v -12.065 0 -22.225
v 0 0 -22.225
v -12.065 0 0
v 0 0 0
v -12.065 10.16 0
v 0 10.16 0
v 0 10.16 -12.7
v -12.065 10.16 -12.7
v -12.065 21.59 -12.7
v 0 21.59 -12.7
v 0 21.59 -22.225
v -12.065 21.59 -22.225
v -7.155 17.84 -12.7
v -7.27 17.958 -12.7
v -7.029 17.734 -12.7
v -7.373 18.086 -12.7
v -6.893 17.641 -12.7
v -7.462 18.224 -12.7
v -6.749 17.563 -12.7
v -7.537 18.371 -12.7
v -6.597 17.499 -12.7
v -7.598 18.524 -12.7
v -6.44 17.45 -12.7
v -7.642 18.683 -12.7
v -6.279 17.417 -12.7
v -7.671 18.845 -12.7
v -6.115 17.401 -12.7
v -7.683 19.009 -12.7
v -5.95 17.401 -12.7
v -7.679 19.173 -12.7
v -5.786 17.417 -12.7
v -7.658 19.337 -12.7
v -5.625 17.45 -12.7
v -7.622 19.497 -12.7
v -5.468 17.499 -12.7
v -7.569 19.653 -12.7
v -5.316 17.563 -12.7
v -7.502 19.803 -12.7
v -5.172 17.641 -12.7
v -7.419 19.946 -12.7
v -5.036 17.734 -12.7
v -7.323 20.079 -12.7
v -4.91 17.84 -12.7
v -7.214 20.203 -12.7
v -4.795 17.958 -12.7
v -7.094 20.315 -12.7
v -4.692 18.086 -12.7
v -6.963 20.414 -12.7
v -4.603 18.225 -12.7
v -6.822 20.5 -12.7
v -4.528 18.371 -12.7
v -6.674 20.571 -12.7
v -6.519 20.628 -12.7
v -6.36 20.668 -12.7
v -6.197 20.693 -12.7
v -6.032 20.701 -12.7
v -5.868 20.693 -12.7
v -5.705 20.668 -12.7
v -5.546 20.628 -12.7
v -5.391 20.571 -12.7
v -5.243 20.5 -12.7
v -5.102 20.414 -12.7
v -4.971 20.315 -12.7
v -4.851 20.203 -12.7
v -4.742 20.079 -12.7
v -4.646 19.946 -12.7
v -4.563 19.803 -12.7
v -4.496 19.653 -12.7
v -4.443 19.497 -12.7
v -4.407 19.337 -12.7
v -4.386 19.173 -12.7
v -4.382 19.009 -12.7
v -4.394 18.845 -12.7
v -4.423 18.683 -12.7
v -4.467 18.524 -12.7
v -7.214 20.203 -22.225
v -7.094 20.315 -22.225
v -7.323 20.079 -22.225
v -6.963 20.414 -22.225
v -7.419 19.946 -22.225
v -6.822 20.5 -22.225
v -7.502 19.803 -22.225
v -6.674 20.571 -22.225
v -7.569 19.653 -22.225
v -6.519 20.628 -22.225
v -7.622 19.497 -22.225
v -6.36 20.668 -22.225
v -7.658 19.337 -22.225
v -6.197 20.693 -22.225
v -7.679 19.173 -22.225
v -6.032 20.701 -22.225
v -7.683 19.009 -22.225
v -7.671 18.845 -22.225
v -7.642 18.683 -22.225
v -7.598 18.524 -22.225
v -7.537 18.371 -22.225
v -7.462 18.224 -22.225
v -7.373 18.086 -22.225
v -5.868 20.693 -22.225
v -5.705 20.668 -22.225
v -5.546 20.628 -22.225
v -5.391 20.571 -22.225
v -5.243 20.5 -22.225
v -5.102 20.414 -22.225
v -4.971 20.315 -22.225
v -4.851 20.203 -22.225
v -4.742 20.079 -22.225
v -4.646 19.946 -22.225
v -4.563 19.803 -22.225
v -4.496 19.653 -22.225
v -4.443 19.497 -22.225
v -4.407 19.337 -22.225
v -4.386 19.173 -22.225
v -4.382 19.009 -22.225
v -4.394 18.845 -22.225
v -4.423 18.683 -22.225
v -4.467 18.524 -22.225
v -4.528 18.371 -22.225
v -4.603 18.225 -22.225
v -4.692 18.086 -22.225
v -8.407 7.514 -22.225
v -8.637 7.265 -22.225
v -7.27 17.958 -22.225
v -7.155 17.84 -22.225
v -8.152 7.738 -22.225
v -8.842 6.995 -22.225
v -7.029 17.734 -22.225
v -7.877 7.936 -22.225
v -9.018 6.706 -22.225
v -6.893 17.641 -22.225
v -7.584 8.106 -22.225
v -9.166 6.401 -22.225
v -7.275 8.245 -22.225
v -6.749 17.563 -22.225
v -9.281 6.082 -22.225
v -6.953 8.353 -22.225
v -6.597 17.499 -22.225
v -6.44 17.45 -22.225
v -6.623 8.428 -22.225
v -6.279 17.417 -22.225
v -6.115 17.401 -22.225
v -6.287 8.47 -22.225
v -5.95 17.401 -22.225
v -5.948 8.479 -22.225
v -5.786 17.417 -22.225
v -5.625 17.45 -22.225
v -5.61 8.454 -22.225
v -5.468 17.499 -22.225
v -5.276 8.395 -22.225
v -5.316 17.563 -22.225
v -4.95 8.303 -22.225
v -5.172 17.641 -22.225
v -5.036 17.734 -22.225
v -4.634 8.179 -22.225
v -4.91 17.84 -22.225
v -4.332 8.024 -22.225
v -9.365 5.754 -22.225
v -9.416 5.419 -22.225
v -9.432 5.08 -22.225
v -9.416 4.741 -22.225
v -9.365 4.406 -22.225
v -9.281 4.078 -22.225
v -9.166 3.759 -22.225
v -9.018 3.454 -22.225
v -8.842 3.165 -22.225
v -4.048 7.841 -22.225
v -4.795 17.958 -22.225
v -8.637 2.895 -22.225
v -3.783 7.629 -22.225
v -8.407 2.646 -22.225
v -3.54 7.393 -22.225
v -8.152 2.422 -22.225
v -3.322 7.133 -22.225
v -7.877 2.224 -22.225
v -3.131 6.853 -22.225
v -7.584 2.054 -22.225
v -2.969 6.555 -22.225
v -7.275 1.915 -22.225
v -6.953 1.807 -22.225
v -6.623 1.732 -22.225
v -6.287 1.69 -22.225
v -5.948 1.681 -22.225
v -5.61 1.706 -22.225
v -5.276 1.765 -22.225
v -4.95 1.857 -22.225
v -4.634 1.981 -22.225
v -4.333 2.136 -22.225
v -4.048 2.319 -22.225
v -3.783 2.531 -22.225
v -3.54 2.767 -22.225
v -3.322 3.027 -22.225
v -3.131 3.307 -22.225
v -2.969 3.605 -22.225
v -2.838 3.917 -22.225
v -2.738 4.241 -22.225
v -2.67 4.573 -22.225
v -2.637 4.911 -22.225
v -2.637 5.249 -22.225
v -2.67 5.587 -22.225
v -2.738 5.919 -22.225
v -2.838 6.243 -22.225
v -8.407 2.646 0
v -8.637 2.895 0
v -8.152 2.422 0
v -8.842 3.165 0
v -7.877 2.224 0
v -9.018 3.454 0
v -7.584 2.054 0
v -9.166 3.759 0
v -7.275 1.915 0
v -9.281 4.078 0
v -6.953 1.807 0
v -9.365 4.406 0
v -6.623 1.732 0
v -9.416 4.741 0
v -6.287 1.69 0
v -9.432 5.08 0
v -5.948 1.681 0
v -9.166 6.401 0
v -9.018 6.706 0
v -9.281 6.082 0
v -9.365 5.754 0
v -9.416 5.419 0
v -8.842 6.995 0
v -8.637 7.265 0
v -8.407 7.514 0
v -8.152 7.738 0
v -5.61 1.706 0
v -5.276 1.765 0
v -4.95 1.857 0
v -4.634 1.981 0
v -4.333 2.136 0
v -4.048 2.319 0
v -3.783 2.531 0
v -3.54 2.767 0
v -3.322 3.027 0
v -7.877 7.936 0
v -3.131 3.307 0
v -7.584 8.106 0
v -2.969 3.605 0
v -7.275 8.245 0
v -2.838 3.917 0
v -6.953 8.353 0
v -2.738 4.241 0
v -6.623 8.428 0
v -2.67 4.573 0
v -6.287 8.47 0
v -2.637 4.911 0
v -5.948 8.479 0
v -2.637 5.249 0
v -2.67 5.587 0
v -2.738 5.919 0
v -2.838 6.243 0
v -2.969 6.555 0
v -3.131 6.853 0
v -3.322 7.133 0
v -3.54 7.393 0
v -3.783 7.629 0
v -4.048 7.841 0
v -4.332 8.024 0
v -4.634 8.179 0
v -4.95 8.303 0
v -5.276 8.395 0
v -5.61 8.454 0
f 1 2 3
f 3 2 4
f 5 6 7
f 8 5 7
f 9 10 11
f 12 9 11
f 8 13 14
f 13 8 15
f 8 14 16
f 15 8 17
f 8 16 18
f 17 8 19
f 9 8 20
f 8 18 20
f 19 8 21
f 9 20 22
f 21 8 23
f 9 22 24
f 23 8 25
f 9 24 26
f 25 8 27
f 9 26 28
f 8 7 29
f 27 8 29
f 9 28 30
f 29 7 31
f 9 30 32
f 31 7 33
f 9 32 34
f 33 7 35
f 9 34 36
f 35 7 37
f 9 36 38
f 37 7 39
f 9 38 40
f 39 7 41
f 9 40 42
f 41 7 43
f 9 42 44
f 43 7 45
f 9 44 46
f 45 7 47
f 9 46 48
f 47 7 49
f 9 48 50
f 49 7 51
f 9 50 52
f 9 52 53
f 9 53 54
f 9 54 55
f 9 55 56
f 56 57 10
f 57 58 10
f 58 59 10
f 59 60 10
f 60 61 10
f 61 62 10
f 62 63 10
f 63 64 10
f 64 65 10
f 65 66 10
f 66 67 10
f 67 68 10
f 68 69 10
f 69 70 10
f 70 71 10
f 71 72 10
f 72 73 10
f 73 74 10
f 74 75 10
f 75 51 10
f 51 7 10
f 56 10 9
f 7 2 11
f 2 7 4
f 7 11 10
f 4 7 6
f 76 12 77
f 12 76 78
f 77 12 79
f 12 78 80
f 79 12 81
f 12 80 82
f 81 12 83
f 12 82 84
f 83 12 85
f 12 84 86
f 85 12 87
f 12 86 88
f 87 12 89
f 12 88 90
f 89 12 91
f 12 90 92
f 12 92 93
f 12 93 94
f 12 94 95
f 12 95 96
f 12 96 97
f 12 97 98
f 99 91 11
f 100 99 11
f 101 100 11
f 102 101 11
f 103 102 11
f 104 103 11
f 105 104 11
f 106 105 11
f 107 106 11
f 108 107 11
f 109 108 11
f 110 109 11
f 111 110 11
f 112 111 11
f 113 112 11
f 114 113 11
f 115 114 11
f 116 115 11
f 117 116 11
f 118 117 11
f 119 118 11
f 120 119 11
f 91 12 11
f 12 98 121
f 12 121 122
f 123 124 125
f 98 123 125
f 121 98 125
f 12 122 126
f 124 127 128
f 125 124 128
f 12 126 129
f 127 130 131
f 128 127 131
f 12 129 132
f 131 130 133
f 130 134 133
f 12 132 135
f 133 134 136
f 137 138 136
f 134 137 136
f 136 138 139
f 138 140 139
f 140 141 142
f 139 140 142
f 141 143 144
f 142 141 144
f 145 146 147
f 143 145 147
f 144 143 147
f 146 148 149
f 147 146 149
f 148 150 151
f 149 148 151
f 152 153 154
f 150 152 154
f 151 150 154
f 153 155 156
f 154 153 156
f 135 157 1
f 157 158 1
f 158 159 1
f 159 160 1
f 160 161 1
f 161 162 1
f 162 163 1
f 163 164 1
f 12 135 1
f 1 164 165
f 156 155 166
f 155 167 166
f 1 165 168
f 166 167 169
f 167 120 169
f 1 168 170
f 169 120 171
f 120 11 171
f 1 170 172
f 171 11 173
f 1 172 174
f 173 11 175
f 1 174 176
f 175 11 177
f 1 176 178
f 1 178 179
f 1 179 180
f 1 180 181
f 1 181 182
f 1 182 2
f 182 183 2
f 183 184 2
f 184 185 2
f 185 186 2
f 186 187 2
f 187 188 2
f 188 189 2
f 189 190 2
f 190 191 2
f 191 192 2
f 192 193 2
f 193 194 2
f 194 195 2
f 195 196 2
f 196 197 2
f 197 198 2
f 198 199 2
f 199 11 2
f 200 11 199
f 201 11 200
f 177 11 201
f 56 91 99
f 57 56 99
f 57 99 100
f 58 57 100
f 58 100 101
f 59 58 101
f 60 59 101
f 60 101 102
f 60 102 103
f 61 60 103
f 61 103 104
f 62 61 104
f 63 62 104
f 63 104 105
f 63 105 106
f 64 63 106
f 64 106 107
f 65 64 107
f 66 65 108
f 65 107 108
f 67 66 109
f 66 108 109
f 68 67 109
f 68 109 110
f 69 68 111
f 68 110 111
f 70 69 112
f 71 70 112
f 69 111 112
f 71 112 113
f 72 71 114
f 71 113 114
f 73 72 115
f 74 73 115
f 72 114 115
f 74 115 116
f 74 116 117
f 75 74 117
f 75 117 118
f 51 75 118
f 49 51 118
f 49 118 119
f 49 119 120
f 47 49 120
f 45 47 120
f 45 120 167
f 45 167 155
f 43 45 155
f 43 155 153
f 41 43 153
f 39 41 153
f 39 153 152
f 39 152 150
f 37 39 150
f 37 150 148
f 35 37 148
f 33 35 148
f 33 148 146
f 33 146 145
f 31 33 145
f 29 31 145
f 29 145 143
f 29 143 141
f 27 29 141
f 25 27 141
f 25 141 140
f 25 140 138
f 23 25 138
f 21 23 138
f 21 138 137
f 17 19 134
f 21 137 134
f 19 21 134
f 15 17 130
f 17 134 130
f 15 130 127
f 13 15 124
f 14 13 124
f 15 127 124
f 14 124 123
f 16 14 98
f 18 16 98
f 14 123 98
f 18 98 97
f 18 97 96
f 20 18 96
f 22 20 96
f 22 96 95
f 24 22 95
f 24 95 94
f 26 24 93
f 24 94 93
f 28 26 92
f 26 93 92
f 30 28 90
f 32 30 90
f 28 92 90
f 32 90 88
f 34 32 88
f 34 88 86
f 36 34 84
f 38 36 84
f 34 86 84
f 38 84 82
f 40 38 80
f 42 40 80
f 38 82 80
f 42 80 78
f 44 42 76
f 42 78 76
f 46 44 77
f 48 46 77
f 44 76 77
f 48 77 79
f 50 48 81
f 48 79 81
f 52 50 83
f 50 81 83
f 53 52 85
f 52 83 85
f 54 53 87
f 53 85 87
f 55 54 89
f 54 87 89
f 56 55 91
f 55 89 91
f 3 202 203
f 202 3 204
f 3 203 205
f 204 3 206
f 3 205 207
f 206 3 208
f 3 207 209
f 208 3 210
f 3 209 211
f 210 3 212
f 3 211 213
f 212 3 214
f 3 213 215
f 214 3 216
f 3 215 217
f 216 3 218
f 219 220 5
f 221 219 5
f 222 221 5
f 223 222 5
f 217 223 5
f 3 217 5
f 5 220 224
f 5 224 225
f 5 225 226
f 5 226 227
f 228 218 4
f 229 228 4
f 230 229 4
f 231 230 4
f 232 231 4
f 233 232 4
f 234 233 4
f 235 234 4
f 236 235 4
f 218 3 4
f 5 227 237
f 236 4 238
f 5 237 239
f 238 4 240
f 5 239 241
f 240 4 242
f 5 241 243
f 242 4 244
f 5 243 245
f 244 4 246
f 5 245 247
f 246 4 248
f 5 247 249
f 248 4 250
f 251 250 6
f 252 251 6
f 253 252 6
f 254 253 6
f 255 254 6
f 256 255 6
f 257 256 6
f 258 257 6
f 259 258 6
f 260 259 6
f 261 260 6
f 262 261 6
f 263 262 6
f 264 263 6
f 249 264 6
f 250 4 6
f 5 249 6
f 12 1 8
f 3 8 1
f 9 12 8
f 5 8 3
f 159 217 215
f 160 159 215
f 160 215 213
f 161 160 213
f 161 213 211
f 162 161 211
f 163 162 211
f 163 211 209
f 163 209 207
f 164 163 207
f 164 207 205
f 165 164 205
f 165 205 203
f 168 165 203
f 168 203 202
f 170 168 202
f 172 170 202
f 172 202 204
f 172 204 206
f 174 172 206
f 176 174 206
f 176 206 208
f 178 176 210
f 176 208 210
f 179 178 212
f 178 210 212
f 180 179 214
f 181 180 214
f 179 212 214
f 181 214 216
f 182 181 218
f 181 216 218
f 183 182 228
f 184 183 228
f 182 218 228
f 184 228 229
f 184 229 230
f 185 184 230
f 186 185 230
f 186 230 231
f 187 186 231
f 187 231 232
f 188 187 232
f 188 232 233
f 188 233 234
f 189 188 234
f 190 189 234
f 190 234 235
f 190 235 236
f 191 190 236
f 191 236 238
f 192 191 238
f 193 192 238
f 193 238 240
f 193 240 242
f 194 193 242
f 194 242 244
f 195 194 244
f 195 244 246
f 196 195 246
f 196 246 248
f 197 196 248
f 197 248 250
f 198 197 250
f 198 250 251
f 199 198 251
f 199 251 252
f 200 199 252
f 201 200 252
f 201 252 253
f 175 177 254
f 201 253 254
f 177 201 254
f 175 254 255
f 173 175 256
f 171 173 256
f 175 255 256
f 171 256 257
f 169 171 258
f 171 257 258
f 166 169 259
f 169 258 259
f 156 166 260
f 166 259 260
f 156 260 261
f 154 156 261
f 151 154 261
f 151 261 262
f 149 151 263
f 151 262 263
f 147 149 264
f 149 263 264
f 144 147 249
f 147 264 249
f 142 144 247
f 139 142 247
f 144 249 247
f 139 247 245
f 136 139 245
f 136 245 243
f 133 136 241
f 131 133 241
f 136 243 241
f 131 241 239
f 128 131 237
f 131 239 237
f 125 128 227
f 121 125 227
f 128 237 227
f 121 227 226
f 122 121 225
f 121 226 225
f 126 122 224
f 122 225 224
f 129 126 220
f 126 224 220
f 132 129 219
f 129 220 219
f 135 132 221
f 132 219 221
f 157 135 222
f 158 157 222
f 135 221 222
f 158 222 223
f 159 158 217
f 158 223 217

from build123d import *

# Parameters (mm, degrees)
BOSS_EXTRUDE1_DEPTH          = 12.065
TAP_DRILL_FOR_M8X1_25_TAP1_D = 6.8
SKETCH6_R                    = 1.651
CUT_EXTRUDE2_DEPTH           = 34.251209752


with BuildPart() as part:
    # Sketch1 → Boss-Extrude1 (new body)
    with BuildSketch(Plane(origin=(0, 0, 0), x_dir=(0, 0, -1), z_dir=(1, 0, 0))):
        Polygon((0, 0), (0, 10.16), (12.7, 10.16), (12.7, 21.59), (22.225, 21.59), (22.225, 0), align=None)
    extrude(amount=-BOSS_EXTRUDE1_DEPTH)

    # Tap Drill for M8x1.25 Tap1 (through all)
    with Locations(Plane(origin=(-0.703177612, 1.547352974, -22.225), x_dir=(1, 0, 0), z_dir=(0, 0, -1))):
        with Locations((-5.329322388, -3.532647026)):
            Hole(TAP_DRILL_FOR_M8X1_25_TAP1_D / 2)

    # Sketch6 → Cut-Extrude2 (cut, through all)
    with BuildSketch(Plane(origin=(0, 0, -22.225), x_dir=(-1, 0, 0), z_dir=(0, 0, -1))):
        with Locations(Location((6.0325, 19.05, 0), (0, 0, 90))):
            Circle(SKETCH6_R)
    extrude(amount=-CUT_EXTRUDE2_DEPTH, mode=Mode.SUBTRACT)


solid = part.part
